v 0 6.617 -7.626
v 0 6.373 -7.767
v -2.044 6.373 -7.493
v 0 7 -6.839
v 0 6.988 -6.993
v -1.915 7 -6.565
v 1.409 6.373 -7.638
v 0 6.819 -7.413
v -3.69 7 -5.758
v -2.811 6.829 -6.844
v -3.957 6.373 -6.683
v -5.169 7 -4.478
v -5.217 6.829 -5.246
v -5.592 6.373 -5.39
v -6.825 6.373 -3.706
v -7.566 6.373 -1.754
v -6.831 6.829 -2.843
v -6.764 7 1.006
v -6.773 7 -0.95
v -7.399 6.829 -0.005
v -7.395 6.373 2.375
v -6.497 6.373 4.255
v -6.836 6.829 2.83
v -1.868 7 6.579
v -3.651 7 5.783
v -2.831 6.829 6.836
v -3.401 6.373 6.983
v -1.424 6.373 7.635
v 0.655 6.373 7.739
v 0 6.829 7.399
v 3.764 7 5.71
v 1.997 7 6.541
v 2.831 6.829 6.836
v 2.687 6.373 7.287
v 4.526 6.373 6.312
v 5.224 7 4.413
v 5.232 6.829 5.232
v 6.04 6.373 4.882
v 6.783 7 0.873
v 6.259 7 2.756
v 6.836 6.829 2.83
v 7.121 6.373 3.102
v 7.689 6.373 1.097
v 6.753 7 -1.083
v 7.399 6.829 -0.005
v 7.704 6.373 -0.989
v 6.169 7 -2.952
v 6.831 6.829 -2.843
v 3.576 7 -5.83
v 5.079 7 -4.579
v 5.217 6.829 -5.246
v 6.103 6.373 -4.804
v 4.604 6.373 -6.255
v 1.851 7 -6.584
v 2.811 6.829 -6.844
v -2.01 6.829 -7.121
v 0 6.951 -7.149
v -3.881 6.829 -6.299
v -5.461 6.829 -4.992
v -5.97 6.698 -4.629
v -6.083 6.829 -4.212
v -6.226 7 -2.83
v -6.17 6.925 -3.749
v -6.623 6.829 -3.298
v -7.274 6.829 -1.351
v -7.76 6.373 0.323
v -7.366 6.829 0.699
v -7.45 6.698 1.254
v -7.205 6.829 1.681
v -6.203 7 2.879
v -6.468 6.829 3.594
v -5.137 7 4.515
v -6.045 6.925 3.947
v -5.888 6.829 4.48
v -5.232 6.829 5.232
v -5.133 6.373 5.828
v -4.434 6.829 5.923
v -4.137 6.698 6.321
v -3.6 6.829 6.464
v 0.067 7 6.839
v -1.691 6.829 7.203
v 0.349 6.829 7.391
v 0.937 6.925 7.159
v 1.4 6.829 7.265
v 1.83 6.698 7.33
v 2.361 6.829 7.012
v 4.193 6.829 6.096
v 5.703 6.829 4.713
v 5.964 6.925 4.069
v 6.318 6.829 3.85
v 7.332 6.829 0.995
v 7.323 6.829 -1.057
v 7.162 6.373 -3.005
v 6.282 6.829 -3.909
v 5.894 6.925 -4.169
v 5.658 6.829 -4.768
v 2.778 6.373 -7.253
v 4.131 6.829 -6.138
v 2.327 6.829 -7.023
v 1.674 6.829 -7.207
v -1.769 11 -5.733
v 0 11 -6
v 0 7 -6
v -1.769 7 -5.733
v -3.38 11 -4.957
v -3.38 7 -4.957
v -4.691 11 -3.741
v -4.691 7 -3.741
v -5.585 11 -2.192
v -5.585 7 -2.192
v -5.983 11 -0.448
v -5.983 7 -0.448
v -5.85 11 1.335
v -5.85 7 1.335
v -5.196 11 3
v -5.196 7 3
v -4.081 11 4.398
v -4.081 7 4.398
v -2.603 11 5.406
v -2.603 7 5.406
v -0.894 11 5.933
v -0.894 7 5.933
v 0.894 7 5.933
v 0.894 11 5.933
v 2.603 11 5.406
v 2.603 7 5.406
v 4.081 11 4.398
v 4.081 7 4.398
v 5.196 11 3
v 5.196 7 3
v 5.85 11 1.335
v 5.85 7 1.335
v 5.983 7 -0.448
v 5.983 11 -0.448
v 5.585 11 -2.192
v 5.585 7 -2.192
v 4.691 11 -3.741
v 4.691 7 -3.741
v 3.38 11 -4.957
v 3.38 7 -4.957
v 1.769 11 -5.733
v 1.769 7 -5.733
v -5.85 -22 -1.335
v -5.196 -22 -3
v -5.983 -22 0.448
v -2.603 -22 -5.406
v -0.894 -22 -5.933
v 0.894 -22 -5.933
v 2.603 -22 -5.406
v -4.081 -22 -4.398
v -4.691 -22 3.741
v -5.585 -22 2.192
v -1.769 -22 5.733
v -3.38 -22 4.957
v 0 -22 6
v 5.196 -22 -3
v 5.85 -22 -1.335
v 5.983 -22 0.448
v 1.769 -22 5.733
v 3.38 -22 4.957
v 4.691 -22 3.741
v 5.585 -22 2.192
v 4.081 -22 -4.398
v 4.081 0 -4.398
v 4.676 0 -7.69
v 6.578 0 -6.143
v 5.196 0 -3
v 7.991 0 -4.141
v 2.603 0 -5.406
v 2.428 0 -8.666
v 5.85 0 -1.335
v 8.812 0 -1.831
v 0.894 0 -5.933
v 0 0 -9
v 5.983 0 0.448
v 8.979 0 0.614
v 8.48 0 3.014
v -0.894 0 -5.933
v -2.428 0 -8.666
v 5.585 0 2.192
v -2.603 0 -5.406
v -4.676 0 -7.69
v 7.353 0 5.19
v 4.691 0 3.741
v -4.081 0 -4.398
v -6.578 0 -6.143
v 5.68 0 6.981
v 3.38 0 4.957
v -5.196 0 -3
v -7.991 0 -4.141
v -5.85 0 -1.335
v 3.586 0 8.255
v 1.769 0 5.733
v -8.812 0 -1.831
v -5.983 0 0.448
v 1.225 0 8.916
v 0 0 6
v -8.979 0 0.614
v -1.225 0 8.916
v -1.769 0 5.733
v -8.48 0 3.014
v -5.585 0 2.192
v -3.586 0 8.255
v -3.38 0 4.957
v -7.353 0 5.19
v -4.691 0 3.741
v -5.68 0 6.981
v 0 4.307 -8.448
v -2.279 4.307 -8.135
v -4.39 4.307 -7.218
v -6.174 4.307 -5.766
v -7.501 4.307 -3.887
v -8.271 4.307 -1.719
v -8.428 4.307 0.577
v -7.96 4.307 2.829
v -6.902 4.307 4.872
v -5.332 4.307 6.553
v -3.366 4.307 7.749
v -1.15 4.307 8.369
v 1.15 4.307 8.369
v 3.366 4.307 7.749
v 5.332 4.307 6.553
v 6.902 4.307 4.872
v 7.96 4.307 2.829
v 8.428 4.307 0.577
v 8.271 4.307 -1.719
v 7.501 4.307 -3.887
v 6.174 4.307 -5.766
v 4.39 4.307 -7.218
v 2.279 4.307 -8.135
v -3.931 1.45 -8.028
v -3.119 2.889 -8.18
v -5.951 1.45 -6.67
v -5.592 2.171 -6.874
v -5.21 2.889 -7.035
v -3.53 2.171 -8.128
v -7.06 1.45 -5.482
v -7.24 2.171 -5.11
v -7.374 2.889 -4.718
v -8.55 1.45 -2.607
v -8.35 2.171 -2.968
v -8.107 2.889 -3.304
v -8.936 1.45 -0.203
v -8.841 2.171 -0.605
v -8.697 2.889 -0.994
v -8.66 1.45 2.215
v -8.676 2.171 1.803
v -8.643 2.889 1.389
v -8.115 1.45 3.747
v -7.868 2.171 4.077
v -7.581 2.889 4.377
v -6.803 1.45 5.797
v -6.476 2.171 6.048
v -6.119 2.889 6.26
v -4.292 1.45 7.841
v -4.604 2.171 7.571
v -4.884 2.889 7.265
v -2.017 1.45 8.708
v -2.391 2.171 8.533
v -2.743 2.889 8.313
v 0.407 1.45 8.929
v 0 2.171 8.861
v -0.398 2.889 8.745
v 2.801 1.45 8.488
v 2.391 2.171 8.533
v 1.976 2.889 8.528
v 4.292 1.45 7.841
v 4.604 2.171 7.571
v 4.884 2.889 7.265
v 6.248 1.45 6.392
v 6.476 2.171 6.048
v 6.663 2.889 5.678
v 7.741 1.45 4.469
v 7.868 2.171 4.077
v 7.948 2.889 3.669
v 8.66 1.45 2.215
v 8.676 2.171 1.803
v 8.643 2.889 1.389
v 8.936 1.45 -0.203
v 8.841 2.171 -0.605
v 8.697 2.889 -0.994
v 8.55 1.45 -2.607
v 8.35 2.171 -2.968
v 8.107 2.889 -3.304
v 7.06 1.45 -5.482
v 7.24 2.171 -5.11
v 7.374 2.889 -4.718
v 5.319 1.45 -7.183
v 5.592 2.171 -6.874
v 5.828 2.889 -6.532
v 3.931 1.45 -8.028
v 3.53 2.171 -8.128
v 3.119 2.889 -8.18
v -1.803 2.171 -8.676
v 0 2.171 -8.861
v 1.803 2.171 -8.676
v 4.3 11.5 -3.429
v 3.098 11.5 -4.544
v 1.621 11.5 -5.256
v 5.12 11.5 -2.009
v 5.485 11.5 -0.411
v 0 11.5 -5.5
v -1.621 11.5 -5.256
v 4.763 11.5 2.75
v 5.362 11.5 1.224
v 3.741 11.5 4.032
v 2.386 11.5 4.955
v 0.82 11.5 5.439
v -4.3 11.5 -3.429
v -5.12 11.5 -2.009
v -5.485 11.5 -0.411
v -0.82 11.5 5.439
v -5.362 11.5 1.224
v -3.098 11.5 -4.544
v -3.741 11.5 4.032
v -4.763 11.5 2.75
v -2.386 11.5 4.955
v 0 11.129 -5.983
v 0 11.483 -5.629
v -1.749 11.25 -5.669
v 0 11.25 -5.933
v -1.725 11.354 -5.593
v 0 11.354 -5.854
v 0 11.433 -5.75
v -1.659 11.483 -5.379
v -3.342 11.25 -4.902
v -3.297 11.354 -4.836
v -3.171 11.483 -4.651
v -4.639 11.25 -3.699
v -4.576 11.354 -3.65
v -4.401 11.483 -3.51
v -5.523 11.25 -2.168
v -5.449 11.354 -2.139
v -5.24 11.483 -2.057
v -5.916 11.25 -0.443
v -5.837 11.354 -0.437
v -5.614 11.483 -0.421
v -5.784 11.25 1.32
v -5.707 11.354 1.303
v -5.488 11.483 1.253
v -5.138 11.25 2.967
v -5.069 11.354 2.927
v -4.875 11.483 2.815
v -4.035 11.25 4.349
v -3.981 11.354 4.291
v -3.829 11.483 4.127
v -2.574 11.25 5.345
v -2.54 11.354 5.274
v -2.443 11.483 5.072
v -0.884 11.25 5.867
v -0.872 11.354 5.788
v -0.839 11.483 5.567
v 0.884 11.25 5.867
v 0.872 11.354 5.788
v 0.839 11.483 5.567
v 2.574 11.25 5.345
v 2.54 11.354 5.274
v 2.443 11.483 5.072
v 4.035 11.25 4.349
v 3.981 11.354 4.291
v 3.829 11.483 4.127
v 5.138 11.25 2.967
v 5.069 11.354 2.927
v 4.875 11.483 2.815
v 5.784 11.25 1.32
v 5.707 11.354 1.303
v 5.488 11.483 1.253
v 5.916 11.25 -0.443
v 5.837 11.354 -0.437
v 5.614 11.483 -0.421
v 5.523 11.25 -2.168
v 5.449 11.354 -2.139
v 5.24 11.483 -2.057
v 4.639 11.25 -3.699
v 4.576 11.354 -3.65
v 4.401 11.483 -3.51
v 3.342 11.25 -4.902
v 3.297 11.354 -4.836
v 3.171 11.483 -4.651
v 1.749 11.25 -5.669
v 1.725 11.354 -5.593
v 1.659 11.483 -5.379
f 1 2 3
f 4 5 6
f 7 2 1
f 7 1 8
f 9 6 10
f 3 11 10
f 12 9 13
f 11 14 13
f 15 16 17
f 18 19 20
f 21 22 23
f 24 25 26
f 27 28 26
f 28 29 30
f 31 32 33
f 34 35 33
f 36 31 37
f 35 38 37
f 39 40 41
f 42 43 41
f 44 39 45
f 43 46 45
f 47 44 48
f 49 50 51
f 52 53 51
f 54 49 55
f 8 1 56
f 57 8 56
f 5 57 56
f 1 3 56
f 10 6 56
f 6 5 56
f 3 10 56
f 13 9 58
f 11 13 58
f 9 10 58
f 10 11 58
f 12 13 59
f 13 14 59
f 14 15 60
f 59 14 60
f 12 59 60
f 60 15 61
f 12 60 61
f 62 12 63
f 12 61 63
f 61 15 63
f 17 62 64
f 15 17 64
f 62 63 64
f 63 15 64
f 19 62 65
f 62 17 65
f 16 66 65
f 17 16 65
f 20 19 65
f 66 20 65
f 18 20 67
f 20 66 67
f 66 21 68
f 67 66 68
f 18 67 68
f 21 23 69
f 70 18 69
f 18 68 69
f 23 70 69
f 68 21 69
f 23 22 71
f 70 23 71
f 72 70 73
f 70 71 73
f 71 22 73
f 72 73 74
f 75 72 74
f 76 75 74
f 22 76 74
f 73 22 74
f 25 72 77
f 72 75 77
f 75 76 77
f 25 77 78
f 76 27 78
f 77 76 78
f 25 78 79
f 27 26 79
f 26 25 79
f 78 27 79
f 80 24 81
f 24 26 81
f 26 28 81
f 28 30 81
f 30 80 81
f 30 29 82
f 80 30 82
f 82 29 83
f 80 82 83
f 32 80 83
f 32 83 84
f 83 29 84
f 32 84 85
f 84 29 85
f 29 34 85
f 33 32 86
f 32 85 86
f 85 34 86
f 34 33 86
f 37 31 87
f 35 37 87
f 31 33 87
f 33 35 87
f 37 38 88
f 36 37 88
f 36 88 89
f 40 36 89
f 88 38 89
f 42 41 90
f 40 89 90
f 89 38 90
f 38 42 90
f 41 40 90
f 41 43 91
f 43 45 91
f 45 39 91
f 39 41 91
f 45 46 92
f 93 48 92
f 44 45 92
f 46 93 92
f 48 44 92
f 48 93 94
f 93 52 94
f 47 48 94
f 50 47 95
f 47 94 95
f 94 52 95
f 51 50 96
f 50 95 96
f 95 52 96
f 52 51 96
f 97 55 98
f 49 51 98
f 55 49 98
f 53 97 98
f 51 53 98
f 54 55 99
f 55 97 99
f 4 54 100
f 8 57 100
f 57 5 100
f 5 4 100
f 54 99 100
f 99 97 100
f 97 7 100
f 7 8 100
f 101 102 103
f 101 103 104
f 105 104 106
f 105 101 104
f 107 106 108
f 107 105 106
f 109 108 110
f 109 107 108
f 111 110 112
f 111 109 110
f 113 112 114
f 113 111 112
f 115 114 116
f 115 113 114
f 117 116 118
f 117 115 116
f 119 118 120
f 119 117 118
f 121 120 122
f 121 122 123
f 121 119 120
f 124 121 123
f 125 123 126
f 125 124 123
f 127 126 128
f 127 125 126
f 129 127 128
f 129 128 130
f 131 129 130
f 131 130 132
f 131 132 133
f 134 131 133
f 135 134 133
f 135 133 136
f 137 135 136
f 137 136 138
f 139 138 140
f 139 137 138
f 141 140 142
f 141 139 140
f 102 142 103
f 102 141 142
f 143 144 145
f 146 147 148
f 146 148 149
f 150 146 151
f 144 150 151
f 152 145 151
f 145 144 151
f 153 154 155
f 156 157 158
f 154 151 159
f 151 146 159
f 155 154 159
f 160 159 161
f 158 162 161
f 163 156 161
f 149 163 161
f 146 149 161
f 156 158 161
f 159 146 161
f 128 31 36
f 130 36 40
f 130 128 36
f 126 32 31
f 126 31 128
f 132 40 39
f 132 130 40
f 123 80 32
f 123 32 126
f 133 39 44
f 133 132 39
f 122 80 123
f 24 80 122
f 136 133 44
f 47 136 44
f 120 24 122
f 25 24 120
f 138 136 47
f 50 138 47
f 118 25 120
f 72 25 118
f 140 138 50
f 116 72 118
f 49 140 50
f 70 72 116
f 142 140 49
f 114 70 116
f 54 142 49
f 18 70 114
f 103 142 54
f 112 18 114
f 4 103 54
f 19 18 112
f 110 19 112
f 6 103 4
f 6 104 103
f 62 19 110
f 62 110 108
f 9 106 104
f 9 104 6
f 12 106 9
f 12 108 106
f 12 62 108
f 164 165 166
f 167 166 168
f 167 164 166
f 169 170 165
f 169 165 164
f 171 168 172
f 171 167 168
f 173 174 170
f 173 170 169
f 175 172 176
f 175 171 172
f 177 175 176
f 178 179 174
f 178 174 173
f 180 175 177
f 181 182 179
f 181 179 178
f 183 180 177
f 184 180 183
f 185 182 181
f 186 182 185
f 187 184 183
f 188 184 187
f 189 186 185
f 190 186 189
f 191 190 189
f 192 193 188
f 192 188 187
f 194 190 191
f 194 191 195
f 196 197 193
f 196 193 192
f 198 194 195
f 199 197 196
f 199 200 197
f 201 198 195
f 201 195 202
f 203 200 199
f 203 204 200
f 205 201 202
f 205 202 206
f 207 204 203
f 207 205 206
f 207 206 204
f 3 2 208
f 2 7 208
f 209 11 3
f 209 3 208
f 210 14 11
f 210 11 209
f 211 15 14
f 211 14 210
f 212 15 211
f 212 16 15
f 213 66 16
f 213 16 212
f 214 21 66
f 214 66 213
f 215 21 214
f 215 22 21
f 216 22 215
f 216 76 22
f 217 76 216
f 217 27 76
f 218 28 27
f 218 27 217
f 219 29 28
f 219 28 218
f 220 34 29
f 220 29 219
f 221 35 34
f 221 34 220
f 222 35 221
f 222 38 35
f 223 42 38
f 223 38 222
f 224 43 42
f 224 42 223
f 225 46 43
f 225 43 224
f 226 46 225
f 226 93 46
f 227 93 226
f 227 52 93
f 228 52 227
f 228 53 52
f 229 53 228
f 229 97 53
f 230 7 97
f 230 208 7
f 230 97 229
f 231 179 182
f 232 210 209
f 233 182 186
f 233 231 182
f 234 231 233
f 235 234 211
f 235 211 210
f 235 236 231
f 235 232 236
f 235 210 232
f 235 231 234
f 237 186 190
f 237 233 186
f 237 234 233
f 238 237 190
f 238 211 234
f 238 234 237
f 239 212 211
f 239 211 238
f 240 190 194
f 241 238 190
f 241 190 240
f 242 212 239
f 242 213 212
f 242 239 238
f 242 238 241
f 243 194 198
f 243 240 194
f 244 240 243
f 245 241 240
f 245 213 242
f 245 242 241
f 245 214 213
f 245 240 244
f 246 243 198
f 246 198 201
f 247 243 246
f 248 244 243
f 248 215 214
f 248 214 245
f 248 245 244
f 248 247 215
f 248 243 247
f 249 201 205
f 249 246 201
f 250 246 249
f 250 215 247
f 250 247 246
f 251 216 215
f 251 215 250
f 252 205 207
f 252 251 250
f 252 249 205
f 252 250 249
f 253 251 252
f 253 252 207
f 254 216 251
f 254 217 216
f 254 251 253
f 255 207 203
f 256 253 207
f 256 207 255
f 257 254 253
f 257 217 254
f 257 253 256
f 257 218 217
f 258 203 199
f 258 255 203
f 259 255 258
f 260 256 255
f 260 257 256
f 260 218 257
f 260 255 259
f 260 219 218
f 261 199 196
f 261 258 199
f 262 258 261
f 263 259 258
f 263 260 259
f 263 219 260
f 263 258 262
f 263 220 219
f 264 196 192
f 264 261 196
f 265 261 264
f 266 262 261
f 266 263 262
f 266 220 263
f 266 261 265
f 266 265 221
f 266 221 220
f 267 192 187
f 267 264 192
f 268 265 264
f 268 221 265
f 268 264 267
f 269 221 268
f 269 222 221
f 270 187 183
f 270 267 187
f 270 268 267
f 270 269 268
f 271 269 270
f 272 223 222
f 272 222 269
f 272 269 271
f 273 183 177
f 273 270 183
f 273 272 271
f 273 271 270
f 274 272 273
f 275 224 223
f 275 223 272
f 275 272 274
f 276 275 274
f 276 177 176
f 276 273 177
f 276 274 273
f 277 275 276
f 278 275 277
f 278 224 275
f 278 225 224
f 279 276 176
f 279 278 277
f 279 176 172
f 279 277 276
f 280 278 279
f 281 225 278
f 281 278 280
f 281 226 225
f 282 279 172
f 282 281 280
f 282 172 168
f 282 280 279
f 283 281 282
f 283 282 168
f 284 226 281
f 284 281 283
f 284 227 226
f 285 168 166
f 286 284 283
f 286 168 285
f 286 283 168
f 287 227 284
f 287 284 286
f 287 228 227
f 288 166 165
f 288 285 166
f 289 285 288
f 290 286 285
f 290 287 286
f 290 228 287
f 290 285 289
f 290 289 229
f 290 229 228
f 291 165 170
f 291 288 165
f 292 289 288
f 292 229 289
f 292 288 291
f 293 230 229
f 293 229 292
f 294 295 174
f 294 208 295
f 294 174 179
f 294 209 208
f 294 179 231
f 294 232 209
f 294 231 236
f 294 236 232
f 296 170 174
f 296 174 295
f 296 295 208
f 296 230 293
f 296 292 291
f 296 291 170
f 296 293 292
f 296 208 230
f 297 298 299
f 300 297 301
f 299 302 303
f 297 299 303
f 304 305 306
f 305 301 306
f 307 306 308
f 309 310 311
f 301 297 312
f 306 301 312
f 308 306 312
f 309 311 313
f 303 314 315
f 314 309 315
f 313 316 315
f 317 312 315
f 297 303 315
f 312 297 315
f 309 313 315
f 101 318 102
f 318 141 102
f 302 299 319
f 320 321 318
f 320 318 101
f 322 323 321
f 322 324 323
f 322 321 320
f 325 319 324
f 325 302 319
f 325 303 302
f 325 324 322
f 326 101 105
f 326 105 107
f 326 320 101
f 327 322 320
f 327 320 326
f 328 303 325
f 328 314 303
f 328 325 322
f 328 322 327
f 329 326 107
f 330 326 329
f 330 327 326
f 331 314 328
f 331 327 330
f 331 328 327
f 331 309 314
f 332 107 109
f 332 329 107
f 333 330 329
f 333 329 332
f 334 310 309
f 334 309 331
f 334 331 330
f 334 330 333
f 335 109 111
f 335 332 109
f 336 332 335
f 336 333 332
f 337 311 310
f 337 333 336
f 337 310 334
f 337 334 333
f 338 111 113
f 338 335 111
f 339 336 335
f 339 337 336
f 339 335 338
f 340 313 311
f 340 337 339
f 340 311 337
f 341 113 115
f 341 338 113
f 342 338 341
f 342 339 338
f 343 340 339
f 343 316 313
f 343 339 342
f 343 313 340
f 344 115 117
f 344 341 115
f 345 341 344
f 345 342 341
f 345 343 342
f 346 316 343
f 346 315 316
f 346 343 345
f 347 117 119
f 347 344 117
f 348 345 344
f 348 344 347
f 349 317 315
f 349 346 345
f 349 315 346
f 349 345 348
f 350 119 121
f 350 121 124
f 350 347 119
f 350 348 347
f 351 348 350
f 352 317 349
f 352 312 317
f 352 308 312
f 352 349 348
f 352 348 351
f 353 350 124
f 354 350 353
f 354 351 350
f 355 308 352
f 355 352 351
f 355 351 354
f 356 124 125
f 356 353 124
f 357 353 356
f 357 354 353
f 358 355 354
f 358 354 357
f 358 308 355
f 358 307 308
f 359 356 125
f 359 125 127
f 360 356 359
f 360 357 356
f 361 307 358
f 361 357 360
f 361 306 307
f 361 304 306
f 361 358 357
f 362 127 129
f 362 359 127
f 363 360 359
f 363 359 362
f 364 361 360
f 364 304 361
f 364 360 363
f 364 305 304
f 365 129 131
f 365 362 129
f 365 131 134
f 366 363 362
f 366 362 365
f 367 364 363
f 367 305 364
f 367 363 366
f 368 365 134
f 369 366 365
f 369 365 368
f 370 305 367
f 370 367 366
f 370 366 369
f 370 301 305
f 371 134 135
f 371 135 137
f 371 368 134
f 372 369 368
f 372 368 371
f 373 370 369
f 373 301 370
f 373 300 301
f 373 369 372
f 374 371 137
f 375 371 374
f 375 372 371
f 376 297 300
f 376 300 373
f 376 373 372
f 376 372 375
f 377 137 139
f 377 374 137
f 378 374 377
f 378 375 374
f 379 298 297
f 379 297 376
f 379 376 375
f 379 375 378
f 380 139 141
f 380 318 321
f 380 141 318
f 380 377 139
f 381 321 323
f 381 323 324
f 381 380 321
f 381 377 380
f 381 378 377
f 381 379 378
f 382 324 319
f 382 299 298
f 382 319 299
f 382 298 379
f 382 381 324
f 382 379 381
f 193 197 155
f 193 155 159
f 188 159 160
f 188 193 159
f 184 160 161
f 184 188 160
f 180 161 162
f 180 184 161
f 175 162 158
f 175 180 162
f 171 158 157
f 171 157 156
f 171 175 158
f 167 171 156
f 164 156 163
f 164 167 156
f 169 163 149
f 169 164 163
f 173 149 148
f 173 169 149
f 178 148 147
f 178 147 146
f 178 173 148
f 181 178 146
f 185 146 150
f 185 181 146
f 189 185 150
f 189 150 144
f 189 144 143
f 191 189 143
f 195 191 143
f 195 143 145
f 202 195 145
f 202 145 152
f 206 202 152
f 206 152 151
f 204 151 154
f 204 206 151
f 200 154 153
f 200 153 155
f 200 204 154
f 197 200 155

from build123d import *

# Parameters (mm, degrees)
CROQUIS1_R              = 6
SALIENTE_EXTRUIR1_DEPTH = 22
REDONDEO2_R             = 1
CROQUIS3_W              = 6
CROQUIS3_H              = 4.5
REDONDEO3_R             = 0.5


with BuildPart() as part:
    # Croquis1 → Saliente-Extruir1 (new body)
    with BuildSketch(Plane(origin=(0, 0, 0), x_dir=(1, 0, 0), z_dir=(0, 1, 0))):
        with Locations(Location((0, 0, 0), (0, 0, 270))):
            Circle(CROQUIS1_R)
    extrude(amount=-SALIENTE_EXTRUIR1_DEPTH)

    # Croquis2 → Revolución1 (revolve)
    with BuildSketch(Plane(origin=(0, 0, 0), x_dir=(0, 0, -1), z_dir=(1, 0, 0))):
        with BuildLine():
            Line((0, 0), (9, 0))
            ThreePointArc((9, 0), (8.62079124, 3.579455266), (7.5, 7))
            Line((7.5, 7), (0, 7))
            Line((0, 7), (0, 0))
        make_face()
    revolve(axis=Axis((0, 0, 0), (0, 1, 0)))

    # Redondeo2
    redondeo2_edges = [part.edges().sort_by_distance(p)[0] for p in [
        (0, 7, 7.5),
    ]]
    fillet(redondeo2_edges, radius=REDONDEO2_R)

    # Croquis3 → Revolución2 (revolve)
    with BuildSketch(Plane(origin=(0, 0, 0), x_dir=(0, 0, -1), z_dir=(1, 0, 0))):
        with Locations((3, 9.25)):
            Rectangle(CROQUIS3_W, CROQUIS3_H)
    revolve(axis=Axis((0, 7, 0), (0, 1, 0)))

    # Redondeo3
    redondeo3_edges = [part.edges().sort_by_distance(p)[0] for p in [
        (0, 11.5, 6),
    ]]
    fillet(redondeo3_edges, radius=REDONDEO3_R)


solid = part.part
